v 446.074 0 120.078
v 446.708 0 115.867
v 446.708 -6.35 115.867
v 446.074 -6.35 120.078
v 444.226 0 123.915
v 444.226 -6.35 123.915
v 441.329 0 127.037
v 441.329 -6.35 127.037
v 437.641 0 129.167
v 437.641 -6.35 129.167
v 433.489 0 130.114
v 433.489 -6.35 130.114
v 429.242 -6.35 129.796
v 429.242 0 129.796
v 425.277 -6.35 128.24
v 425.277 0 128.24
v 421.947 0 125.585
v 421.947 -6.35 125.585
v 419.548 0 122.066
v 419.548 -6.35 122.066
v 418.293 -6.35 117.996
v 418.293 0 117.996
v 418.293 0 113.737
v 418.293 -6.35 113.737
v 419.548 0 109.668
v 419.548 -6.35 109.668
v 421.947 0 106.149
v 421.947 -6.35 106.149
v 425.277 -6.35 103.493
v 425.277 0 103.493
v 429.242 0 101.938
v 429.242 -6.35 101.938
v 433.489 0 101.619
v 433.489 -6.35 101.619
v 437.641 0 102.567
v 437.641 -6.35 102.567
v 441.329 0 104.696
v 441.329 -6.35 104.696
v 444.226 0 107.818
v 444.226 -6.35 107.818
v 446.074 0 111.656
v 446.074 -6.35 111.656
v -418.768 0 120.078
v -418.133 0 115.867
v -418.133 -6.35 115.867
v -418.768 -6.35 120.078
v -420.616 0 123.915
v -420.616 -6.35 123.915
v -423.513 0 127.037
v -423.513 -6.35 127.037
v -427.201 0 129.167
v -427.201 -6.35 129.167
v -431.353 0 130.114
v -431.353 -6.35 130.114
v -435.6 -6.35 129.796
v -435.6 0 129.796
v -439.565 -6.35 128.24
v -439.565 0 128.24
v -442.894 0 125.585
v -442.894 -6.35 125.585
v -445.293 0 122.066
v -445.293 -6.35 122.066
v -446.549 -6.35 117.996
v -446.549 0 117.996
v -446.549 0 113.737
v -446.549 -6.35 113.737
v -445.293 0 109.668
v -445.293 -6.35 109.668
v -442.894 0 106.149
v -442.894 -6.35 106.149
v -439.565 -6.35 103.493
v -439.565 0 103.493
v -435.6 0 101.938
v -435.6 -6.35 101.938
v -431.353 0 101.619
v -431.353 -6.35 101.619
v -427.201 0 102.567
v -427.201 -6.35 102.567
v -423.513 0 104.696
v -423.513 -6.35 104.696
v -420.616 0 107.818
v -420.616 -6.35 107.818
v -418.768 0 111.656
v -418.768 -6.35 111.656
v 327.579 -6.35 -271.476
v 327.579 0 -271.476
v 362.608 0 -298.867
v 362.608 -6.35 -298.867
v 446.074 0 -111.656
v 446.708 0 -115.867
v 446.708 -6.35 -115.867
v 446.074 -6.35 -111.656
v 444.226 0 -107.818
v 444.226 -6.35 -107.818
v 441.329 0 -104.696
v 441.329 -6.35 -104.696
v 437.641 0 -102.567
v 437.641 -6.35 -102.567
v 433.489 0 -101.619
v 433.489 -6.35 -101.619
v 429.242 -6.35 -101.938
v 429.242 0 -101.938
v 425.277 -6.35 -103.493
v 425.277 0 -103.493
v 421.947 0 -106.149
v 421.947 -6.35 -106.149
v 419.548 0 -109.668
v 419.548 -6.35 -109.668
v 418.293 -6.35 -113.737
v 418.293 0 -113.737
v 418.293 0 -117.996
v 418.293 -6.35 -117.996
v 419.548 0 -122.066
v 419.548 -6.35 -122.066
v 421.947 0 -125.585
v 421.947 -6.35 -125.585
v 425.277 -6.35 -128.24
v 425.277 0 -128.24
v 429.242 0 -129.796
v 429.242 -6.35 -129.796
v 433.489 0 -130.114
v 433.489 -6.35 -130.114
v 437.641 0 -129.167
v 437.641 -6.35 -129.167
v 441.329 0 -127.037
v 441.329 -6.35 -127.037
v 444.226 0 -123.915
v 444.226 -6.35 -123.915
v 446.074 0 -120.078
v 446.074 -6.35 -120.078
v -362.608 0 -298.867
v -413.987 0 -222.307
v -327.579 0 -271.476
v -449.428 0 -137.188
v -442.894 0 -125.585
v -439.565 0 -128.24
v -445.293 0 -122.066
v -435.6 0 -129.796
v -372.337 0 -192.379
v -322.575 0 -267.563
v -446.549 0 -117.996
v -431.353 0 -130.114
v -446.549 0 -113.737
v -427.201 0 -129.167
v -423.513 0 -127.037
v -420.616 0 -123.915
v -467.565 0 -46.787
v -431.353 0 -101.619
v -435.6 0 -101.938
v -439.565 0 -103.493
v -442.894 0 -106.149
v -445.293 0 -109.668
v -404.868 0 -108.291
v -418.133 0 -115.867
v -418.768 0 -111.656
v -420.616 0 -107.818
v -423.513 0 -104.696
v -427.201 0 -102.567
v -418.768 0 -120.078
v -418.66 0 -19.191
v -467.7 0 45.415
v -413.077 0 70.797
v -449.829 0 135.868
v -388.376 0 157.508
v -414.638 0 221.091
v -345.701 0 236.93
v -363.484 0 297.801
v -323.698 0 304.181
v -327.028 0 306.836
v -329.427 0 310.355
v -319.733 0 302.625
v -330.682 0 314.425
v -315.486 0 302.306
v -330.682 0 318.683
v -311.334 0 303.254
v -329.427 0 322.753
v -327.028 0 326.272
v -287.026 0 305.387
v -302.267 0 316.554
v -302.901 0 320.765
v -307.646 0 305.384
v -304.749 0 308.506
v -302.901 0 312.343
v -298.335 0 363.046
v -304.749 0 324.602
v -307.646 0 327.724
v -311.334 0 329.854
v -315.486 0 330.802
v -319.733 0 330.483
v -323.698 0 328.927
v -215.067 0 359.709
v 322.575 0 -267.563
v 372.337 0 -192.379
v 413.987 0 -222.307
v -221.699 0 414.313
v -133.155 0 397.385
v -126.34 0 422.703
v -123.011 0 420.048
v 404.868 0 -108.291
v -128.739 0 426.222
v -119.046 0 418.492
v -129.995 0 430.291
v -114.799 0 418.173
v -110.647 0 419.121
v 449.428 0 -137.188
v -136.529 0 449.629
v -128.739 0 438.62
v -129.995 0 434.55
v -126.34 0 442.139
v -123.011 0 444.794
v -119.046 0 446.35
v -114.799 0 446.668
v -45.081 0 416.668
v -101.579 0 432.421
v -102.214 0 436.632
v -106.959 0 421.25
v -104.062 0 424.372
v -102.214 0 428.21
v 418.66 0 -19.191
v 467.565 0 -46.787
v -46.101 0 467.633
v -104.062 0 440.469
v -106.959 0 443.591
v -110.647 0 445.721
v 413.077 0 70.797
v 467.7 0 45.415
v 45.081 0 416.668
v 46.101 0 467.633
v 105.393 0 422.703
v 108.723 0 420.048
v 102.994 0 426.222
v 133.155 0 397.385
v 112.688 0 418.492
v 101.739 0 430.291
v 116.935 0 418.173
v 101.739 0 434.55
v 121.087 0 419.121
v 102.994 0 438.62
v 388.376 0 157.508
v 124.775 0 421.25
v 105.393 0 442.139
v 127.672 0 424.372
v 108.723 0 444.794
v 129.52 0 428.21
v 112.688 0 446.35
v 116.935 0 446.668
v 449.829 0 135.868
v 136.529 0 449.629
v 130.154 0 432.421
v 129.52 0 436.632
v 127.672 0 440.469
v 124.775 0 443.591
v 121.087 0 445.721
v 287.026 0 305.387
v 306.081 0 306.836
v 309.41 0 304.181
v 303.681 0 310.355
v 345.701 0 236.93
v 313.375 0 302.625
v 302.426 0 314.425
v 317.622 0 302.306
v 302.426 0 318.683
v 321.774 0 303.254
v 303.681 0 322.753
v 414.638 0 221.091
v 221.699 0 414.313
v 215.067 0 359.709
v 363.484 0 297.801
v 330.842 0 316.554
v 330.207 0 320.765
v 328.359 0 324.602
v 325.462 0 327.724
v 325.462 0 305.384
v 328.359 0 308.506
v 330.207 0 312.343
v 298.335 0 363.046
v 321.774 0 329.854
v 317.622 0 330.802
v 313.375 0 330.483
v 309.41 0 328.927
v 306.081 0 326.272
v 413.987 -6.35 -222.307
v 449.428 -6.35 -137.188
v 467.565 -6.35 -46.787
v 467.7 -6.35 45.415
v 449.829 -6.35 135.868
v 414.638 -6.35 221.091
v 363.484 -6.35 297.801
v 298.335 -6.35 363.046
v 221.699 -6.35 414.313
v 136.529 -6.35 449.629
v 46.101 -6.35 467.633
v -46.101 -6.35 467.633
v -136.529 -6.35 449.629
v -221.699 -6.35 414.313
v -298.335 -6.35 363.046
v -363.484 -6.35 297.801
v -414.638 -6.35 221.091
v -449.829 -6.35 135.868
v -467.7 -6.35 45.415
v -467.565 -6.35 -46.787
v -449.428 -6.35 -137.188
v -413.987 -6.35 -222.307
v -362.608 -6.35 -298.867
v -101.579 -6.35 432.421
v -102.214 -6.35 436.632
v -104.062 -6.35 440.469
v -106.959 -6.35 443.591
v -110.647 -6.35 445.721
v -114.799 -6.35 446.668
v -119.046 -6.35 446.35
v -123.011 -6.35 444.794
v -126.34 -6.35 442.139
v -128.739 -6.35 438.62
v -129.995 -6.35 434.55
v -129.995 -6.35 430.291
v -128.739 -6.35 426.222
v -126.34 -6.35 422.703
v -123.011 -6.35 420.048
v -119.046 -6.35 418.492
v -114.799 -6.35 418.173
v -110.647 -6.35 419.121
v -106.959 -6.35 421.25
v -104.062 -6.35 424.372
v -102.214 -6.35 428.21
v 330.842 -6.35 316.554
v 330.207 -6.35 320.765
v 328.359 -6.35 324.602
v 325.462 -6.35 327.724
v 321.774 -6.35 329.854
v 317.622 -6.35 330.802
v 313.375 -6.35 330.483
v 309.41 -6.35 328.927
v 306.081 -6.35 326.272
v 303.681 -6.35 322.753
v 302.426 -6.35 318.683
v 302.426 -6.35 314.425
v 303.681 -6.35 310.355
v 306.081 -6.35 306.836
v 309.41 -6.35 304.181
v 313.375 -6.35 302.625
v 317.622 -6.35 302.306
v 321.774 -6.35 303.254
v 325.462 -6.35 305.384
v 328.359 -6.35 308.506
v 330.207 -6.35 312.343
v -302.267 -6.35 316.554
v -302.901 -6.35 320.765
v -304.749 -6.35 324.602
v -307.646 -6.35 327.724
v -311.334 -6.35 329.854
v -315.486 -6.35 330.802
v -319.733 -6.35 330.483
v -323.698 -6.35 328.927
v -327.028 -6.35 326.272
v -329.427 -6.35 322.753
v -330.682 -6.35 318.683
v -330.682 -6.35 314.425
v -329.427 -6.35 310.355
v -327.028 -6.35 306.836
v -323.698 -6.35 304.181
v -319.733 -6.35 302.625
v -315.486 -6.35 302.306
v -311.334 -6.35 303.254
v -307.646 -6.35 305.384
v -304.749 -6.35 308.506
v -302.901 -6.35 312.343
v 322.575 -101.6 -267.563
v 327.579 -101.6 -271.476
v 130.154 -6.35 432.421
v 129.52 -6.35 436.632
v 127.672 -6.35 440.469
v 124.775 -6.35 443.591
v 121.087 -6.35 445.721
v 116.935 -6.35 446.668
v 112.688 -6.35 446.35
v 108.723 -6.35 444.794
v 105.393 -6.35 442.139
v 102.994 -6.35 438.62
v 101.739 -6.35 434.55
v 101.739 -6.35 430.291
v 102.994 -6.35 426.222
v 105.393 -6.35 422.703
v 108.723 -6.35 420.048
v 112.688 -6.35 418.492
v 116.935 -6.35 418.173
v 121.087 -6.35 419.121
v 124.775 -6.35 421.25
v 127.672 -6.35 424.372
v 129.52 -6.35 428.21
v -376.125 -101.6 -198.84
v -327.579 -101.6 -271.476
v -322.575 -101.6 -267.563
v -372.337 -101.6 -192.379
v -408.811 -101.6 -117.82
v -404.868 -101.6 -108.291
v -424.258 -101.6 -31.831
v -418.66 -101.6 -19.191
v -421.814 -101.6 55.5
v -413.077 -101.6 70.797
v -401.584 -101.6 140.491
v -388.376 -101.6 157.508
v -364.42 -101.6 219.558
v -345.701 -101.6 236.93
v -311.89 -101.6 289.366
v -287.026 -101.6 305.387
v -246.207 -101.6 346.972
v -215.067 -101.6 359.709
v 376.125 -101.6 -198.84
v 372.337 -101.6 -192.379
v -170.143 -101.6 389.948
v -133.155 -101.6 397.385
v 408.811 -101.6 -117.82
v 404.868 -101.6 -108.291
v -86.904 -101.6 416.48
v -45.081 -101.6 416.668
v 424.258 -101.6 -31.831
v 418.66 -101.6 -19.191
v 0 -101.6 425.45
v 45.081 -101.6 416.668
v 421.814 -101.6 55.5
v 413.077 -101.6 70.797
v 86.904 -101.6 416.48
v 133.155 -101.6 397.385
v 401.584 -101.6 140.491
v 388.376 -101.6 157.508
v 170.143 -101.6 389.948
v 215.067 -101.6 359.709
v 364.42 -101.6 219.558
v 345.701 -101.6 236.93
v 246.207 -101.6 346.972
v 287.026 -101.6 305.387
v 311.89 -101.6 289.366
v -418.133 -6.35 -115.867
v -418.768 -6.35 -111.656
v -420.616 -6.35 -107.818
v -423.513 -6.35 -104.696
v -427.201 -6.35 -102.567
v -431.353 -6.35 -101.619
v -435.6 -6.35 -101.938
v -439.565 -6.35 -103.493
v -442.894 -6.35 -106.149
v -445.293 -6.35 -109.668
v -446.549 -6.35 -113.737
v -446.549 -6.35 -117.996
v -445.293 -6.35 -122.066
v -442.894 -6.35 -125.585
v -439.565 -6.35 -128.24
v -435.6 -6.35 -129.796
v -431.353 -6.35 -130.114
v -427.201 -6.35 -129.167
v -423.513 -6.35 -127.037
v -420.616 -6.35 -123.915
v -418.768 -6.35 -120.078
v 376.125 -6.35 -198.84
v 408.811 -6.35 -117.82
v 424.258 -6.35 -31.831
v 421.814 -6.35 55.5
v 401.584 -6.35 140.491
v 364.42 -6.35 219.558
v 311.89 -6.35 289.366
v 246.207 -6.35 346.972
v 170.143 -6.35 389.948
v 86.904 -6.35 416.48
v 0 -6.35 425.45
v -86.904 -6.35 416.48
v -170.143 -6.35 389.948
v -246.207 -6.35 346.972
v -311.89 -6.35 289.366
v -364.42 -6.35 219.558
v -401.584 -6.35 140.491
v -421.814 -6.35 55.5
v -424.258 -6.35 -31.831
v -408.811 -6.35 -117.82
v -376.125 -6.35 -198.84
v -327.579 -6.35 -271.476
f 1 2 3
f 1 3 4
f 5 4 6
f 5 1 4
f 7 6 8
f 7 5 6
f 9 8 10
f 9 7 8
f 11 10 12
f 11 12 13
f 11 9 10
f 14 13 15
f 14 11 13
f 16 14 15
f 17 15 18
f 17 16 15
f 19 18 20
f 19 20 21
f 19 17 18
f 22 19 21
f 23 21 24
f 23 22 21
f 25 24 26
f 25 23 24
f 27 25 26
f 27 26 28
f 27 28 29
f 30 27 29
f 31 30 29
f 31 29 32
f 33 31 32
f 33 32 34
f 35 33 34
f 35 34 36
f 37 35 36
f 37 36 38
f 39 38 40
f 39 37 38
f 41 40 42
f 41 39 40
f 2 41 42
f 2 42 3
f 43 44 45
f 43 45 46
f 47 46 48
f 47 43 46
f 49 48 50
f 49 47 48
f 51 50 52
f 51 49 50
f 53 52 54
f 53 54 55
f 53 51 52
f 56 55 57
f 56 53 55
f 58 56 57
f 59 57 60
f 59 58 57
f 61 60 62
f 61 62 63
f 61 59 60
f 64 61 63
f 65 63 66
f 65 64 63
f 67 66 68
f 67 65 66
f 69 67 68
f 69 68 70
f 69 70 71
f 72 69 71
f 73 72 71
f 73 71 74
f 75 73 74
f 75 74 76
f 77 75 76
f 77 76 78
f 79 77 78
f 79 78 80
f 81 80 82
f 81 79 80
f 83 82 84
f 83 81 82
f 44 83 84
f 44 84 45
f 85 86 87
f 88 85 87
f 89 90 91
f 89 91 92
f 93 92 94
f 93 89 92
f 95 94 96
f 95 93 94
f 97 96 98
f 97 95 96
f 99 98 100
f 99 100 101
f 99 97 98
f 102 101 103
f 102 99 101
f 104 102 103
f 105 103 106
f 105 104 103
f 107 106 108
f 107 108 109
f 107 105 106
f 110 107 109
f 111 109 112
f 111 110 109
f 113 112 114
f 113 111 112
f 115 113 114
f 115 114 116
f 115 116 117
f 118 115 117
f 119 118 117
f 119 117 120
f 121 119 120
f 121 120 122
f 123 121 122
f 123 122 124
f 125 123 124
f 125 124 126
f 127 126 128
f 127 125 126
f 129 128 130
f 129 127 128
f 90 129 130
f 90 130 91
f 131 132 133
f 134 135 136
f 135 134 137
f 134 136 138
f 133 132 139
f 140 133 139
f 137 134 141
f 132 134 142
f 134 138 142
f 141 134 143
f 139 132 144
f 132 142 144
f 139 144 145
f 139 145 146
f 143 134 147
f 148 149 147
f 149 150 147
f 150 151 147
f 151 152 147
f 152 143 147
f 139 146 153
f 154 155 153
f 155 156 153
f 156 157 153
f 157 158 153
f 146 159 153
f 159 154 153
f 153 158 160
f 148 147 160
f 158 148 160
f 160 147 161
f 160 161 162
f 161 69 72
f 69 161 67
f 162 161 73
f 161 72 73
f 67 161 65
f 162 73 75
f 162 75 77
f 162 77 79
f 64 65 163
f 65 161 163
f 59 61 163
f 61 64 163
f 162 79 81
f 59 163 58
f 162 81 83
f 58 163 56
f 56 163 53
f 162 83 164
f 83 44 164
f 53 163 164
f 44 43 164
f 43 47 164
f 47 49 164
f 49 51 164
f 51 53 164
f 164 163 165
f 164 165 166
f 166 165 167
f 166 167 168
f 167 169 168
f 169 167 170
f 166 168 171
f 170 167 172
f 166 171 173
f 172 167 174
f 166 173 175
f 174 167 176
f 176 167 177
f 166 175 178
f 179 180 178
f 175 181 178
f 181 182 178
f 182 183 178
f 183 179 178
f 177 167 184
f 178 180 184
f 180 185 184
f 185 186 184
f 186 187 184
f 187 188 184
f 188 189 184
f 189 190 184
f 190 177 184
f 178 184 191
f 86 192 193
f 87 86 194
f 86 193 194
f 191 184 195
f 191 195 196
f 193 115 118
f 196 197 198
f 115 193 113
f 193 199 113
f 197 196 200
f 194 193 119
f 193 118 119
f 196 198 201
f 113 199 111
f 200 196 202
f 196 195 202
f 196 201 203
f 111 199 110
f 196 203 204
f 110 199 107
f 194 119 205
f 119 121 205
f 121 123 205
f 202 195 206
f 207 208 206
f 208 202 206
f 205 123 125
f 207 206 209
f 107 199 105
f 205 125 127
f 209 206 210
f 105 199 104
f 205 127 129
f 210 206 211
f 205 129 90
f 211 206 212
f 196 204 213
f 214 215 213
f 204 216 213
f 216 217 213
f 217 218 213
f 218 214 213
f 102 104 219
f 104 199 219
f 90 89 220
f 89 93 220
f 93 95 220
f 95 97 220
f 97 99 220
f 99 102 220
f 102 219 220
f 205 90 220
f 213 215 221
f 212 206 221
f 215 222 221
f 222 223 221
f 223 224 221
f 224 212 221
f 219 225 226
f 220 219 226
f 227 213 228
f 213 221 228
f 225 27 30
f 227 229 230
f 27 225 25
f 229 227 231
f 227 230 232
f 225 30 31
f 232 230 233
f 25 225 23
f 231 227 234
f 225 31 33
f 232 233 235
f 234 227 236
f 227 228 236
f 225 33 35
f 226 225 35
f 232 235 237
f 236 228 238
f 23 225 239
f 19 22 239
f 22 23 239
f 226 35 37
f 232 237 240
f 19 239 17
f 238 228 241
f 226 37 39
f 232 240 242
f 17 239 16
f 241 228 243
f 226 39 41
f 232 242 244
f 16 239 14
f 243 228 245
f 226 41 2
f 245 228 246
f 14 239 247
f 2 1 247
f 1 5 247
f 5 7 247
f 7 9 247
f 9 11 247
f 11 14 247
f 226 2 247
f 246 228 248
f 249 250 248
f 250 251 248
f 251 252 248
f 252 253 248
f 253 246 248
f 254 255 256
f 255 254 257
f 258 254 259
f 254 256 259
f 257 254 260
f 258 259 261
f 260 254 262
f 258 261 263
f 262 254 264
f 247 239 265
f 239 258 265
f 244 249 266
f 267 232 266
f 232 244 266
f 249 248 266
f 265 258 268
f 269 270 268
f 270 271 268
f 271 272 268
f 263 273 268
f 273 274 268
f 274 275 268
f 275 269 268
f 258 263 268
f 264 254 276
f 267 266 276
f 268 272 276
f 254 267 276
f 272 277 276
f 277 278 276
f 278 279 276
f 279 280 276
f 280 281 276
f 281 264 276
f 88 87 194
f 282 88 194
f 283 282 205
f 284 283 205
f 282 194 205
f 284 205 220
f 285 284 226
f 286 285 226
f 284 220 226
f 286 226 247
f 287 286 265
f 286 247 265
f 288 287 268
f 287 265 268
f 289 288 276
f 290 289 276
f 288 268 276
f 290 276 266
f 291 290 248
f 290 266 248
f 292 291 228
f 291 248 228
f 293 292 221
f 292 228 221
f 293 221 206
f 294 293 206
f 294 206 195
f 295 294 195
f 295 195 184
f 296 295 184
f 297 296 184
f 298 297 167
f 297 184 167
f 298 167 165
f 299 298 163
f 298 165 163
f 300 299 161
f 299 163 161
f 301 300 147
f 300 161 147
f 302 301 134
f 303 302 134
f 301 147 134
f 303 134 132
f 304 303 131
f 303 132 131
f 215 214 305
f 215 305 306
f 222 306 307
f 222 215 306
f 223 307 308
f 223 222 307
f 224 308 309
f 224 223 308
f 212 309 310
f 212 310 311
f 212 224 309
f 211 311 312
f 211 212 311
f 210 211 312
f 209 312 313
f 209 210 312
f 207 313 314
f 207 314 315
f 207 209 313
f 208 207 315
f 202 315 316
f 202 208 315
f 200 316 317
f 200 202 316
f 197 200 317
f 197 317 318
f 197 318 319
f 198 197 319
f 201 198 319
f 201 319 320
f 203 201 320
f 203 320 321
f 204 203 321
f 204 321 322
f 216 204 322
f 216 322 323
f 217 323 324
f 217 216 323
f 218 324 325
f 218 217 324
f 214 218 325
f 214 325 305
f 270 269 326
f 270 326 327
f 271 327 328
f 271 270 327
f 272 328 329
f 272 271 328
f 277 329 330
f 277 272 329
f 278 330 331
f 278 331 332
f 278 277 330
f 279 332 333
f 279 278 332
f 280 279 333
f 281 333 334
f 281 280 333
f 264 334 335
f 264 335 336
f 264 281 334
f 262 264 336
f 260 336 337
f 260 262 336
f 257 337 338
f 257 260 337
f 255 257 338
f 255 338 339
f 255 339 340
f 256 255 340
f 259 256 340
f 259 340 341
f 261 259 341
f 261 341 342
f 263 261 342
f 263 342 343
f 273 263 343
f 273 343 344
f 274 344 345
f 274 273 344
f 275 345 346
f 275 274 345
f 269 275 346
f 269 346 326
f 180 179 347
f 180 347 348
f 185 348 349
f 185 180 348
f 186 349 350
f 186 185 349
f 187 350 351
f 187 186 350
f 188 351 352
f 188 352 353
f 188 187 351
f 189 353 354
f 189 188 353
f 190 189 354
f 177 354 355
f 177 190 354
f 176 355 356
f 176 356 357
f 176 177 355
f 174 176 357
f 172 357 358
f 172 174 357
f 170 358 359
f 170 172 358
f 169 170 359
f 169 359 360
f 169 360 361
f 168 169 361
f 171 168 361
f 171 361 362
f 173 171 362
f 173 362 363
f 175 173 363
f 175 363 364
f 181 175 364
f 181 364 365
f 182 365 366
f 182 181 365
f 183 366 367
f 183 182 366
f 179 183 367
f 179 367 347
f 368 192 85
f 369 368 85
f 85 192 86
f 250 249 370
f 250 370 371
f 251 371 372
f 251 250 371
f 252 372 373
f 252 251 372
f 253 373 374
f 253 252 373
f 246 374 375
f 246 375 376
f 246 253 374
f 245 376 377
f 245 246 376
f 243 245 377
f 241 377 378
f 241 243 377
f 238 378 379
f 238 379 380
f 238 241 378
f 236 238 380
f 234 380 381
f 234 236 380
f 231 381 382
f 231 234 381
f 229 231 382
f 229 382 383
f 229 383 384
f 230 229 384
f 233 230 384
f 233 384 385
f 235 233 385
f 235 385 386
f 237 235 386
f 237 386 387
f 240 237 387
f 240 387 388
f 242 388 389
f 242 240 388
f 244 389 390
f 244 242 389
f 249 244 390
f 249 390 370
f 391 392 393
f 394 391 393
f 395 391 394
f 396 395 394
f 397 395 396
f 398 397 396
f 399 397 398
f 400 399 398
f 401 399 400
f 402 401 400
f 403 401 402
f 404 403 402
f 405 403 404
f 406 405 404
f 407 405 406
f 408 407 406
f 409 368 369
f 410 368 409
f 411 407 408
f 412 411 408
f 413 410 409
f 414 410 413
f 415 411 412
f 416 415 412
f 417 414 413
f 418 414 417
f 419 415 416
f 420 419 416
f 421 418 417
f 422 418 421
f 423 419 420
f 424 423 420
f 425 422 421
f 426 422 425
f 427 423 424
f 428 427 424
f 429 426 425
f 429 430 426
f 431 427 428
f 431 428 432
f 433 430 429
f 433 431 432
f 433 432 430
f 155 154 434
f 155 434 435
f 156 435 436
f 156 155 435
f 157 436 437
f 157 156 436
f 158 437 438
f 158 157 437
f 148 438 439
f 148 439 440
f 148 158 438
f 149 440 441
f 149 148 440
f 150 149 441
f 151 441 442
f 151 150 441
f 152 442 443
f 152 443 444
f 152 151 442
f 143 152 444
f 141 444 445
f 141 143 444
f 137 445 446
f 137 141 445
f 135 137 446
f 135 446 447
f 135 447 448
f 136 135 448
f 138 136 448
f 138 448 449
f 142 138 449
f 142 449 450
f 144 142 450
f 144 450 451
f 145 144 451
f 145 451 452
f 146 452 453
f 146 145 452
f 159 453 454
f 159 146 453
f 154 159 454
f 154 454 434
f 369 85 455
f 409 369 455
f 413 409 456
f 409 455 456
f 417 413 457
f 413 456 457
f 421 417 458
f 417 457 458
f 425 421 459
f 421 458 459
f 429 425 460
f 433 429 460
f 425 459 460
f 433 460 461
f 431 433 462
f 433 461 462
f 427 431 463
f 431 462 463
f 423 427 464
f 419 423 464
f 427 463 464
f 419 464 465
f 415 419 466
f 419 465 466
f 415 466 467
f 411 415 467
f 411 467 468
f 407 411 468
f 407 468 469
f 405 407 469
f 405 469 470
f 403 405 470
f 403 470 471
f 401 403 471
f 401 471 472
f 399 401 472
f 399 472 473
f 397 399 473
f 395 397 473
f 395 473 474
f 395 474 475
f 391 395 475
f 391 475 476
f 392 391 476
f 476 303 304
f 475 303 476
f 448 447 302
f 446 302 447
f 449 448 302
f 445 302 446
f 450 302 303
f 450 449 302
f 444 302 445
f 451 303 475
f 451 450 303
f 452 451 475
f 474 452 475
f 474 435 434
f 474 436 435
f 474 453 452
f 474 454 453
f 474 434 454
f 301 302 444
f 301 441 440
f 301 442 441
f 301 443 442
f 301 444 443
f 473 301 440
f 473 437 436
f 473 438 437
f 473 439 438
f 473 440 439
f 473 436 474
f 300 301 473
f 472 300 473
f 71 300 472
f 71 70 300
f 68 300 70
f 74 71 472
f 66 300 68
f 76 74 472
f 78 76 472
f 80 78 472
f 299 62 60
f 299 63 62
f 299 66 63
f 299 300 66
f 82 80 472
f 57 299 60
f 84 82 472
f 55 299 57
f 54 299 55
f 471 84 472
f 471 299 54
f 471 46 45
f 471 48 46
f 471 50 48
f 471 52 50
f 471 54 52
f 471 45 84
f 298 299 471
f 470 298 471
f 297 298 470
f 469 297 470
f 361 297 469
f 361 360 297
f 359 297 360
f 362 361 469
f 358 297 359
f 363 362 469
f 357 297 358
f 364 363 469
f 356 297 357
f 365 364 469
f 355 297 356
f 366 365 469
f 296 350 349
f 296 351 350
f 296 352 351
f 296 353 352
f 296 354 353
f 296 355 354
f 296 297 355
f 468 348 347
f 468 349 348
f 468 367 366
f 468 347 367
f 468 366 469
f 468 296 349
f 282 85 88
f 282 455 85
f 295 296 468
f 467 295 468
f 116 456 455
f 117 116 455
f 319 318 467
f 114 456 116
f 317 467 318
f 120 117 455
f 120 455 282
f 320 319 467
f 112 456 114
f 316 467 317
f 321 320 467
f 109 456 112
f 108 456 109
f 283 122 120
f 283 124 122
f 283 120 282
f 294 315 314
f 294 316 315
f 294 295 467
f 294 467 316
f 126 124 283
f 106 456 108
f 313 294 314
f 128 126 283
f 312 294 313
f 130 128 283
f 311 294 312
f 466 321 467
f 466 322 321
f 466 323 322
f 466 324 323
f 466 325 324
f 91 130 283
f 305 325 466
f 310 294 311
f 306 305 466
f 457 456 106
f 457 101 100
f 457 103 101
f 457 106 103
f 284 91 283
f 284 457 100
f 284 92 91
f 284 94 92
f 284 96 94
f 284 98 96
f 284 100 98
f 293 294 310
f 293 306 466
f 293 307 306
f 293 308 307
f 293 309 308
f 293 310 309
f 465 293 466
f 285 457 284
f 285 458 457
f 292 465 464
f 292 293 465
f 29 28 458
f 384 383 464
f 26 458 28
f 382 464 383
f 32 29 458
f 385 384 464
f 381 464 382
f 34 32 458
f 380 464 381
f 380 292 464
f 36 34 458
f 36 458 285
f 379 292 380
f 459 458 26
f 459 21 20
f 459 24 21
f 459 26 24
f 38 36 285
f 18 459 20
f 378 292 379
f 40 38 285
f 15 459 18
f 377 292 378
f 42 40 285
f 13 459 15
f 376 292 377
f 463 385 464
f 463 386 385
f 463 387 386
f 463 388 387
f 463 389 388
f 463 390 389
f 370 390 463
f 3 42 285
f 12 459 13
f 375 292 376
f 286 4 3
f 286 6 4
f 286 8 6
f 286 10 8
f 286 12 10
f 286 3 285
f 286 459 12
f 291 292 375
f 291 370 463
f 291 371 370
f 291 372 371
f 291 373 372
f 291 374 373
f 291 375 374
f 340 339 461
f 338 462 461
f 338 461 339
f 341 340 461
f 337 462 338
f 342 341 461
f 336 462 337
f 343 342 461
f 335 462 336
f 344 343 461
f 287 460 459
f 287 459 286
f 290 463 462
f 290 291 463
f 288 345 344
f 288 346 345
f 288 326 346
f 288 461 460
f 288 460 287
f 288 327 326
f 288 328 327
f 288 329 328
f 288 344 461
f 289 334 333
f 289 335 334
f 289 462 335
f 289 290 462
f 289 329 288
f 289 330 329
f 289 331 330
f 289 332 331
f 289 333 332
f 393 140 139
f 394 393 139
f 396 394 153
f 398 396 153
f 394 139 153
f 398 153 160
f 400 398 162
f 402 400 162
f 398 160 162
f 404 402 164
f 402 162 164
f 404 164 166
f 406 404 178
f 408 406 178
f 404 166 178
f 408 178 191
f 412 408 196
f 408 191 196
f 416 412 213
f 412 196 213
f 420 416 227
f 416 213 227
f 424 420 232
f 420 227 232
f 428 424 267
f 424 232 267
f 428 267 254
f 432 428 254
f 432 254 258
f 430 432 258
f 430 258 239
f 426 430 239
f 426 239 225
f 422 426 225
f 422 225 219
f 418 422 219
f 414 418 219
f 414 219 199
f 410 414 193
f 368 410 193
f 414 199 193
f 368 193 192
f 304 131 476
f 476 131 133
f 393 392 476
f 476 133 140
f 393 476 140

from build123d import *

# Parameters (mm, degrees)
F0_R     = 14.2875
F1_DEPTH = 6.35
F2_DEPTH = 101.6


with BuildPart() as f1:
    # F0 (on Front) → F1 (new body)
    with BuildSketch(Plane.XZ):
        with BuildLine():
            Line((327.579371, -271.476441), (362.607836, -298.86714))
            ThreePointArc((362.607836, -298.86714), (0, 469.9), (-362.607836, -298.86714))
            Line((-362.607836, -298.86714), (-327.579371, -271.476441))
            ThreePointArc((-327.579371, -271.476441), (0, 425.45), (327.579371, -271.476441))
        make_face()
        with Locations((-432.420844, -115.866816)):
            Circle(F0_R, mode=Mode.SUBTRACT)
        with Locations((432.420844, -115.866816)):
            Circle(F0_R, mode=Mode.SUBTRACT)
        with Locations((-432.420844, 115.866816)):
            Circle(F0_R, mode=Mode.SUBTRACT)
        with Locations((-316.554028, 316.554028)):
            Circle(F0_R, mode=Mode.SUBTRACT)
        with Locations((-115.866816, 432.420844)):
            Circle(F0_R, mode=Mode.SUBTRACT)
        with Locations((432.420844, 115.866816)):
            Circle(F0_R, mode=Mode.SUBTRACT)
        with Locations((115.866816, 432.420844)):
            Circle(F0_R, mode=Mode.SUBTRACT)
        with Locations((316.554028, 316.554028)):
            Circle(F0_R, mode=Mode.SUBTRACT)
    extrude(amount=F1_DEPTH)

    # F0 (on Front) → F2 (join)
    with BuildSketch(Plane.XZ):
        with BuildLine():
            Line((322.575083, -267.563312), (327.579371, -271.476441))
            ThreePointArc((327.579371, -271.476441), (0, 425.45), (-327.579371, -271.476441))
            Line((-327.579371, -271.476441), (-322.575083, -267.563312))
            ThreePointArc((-322.575083, -267.563312), (0, 419.1), (322.575083, -267.563312))
        make_face()
    extrude(amount=F2_DEPTH)


solid = f1.part
